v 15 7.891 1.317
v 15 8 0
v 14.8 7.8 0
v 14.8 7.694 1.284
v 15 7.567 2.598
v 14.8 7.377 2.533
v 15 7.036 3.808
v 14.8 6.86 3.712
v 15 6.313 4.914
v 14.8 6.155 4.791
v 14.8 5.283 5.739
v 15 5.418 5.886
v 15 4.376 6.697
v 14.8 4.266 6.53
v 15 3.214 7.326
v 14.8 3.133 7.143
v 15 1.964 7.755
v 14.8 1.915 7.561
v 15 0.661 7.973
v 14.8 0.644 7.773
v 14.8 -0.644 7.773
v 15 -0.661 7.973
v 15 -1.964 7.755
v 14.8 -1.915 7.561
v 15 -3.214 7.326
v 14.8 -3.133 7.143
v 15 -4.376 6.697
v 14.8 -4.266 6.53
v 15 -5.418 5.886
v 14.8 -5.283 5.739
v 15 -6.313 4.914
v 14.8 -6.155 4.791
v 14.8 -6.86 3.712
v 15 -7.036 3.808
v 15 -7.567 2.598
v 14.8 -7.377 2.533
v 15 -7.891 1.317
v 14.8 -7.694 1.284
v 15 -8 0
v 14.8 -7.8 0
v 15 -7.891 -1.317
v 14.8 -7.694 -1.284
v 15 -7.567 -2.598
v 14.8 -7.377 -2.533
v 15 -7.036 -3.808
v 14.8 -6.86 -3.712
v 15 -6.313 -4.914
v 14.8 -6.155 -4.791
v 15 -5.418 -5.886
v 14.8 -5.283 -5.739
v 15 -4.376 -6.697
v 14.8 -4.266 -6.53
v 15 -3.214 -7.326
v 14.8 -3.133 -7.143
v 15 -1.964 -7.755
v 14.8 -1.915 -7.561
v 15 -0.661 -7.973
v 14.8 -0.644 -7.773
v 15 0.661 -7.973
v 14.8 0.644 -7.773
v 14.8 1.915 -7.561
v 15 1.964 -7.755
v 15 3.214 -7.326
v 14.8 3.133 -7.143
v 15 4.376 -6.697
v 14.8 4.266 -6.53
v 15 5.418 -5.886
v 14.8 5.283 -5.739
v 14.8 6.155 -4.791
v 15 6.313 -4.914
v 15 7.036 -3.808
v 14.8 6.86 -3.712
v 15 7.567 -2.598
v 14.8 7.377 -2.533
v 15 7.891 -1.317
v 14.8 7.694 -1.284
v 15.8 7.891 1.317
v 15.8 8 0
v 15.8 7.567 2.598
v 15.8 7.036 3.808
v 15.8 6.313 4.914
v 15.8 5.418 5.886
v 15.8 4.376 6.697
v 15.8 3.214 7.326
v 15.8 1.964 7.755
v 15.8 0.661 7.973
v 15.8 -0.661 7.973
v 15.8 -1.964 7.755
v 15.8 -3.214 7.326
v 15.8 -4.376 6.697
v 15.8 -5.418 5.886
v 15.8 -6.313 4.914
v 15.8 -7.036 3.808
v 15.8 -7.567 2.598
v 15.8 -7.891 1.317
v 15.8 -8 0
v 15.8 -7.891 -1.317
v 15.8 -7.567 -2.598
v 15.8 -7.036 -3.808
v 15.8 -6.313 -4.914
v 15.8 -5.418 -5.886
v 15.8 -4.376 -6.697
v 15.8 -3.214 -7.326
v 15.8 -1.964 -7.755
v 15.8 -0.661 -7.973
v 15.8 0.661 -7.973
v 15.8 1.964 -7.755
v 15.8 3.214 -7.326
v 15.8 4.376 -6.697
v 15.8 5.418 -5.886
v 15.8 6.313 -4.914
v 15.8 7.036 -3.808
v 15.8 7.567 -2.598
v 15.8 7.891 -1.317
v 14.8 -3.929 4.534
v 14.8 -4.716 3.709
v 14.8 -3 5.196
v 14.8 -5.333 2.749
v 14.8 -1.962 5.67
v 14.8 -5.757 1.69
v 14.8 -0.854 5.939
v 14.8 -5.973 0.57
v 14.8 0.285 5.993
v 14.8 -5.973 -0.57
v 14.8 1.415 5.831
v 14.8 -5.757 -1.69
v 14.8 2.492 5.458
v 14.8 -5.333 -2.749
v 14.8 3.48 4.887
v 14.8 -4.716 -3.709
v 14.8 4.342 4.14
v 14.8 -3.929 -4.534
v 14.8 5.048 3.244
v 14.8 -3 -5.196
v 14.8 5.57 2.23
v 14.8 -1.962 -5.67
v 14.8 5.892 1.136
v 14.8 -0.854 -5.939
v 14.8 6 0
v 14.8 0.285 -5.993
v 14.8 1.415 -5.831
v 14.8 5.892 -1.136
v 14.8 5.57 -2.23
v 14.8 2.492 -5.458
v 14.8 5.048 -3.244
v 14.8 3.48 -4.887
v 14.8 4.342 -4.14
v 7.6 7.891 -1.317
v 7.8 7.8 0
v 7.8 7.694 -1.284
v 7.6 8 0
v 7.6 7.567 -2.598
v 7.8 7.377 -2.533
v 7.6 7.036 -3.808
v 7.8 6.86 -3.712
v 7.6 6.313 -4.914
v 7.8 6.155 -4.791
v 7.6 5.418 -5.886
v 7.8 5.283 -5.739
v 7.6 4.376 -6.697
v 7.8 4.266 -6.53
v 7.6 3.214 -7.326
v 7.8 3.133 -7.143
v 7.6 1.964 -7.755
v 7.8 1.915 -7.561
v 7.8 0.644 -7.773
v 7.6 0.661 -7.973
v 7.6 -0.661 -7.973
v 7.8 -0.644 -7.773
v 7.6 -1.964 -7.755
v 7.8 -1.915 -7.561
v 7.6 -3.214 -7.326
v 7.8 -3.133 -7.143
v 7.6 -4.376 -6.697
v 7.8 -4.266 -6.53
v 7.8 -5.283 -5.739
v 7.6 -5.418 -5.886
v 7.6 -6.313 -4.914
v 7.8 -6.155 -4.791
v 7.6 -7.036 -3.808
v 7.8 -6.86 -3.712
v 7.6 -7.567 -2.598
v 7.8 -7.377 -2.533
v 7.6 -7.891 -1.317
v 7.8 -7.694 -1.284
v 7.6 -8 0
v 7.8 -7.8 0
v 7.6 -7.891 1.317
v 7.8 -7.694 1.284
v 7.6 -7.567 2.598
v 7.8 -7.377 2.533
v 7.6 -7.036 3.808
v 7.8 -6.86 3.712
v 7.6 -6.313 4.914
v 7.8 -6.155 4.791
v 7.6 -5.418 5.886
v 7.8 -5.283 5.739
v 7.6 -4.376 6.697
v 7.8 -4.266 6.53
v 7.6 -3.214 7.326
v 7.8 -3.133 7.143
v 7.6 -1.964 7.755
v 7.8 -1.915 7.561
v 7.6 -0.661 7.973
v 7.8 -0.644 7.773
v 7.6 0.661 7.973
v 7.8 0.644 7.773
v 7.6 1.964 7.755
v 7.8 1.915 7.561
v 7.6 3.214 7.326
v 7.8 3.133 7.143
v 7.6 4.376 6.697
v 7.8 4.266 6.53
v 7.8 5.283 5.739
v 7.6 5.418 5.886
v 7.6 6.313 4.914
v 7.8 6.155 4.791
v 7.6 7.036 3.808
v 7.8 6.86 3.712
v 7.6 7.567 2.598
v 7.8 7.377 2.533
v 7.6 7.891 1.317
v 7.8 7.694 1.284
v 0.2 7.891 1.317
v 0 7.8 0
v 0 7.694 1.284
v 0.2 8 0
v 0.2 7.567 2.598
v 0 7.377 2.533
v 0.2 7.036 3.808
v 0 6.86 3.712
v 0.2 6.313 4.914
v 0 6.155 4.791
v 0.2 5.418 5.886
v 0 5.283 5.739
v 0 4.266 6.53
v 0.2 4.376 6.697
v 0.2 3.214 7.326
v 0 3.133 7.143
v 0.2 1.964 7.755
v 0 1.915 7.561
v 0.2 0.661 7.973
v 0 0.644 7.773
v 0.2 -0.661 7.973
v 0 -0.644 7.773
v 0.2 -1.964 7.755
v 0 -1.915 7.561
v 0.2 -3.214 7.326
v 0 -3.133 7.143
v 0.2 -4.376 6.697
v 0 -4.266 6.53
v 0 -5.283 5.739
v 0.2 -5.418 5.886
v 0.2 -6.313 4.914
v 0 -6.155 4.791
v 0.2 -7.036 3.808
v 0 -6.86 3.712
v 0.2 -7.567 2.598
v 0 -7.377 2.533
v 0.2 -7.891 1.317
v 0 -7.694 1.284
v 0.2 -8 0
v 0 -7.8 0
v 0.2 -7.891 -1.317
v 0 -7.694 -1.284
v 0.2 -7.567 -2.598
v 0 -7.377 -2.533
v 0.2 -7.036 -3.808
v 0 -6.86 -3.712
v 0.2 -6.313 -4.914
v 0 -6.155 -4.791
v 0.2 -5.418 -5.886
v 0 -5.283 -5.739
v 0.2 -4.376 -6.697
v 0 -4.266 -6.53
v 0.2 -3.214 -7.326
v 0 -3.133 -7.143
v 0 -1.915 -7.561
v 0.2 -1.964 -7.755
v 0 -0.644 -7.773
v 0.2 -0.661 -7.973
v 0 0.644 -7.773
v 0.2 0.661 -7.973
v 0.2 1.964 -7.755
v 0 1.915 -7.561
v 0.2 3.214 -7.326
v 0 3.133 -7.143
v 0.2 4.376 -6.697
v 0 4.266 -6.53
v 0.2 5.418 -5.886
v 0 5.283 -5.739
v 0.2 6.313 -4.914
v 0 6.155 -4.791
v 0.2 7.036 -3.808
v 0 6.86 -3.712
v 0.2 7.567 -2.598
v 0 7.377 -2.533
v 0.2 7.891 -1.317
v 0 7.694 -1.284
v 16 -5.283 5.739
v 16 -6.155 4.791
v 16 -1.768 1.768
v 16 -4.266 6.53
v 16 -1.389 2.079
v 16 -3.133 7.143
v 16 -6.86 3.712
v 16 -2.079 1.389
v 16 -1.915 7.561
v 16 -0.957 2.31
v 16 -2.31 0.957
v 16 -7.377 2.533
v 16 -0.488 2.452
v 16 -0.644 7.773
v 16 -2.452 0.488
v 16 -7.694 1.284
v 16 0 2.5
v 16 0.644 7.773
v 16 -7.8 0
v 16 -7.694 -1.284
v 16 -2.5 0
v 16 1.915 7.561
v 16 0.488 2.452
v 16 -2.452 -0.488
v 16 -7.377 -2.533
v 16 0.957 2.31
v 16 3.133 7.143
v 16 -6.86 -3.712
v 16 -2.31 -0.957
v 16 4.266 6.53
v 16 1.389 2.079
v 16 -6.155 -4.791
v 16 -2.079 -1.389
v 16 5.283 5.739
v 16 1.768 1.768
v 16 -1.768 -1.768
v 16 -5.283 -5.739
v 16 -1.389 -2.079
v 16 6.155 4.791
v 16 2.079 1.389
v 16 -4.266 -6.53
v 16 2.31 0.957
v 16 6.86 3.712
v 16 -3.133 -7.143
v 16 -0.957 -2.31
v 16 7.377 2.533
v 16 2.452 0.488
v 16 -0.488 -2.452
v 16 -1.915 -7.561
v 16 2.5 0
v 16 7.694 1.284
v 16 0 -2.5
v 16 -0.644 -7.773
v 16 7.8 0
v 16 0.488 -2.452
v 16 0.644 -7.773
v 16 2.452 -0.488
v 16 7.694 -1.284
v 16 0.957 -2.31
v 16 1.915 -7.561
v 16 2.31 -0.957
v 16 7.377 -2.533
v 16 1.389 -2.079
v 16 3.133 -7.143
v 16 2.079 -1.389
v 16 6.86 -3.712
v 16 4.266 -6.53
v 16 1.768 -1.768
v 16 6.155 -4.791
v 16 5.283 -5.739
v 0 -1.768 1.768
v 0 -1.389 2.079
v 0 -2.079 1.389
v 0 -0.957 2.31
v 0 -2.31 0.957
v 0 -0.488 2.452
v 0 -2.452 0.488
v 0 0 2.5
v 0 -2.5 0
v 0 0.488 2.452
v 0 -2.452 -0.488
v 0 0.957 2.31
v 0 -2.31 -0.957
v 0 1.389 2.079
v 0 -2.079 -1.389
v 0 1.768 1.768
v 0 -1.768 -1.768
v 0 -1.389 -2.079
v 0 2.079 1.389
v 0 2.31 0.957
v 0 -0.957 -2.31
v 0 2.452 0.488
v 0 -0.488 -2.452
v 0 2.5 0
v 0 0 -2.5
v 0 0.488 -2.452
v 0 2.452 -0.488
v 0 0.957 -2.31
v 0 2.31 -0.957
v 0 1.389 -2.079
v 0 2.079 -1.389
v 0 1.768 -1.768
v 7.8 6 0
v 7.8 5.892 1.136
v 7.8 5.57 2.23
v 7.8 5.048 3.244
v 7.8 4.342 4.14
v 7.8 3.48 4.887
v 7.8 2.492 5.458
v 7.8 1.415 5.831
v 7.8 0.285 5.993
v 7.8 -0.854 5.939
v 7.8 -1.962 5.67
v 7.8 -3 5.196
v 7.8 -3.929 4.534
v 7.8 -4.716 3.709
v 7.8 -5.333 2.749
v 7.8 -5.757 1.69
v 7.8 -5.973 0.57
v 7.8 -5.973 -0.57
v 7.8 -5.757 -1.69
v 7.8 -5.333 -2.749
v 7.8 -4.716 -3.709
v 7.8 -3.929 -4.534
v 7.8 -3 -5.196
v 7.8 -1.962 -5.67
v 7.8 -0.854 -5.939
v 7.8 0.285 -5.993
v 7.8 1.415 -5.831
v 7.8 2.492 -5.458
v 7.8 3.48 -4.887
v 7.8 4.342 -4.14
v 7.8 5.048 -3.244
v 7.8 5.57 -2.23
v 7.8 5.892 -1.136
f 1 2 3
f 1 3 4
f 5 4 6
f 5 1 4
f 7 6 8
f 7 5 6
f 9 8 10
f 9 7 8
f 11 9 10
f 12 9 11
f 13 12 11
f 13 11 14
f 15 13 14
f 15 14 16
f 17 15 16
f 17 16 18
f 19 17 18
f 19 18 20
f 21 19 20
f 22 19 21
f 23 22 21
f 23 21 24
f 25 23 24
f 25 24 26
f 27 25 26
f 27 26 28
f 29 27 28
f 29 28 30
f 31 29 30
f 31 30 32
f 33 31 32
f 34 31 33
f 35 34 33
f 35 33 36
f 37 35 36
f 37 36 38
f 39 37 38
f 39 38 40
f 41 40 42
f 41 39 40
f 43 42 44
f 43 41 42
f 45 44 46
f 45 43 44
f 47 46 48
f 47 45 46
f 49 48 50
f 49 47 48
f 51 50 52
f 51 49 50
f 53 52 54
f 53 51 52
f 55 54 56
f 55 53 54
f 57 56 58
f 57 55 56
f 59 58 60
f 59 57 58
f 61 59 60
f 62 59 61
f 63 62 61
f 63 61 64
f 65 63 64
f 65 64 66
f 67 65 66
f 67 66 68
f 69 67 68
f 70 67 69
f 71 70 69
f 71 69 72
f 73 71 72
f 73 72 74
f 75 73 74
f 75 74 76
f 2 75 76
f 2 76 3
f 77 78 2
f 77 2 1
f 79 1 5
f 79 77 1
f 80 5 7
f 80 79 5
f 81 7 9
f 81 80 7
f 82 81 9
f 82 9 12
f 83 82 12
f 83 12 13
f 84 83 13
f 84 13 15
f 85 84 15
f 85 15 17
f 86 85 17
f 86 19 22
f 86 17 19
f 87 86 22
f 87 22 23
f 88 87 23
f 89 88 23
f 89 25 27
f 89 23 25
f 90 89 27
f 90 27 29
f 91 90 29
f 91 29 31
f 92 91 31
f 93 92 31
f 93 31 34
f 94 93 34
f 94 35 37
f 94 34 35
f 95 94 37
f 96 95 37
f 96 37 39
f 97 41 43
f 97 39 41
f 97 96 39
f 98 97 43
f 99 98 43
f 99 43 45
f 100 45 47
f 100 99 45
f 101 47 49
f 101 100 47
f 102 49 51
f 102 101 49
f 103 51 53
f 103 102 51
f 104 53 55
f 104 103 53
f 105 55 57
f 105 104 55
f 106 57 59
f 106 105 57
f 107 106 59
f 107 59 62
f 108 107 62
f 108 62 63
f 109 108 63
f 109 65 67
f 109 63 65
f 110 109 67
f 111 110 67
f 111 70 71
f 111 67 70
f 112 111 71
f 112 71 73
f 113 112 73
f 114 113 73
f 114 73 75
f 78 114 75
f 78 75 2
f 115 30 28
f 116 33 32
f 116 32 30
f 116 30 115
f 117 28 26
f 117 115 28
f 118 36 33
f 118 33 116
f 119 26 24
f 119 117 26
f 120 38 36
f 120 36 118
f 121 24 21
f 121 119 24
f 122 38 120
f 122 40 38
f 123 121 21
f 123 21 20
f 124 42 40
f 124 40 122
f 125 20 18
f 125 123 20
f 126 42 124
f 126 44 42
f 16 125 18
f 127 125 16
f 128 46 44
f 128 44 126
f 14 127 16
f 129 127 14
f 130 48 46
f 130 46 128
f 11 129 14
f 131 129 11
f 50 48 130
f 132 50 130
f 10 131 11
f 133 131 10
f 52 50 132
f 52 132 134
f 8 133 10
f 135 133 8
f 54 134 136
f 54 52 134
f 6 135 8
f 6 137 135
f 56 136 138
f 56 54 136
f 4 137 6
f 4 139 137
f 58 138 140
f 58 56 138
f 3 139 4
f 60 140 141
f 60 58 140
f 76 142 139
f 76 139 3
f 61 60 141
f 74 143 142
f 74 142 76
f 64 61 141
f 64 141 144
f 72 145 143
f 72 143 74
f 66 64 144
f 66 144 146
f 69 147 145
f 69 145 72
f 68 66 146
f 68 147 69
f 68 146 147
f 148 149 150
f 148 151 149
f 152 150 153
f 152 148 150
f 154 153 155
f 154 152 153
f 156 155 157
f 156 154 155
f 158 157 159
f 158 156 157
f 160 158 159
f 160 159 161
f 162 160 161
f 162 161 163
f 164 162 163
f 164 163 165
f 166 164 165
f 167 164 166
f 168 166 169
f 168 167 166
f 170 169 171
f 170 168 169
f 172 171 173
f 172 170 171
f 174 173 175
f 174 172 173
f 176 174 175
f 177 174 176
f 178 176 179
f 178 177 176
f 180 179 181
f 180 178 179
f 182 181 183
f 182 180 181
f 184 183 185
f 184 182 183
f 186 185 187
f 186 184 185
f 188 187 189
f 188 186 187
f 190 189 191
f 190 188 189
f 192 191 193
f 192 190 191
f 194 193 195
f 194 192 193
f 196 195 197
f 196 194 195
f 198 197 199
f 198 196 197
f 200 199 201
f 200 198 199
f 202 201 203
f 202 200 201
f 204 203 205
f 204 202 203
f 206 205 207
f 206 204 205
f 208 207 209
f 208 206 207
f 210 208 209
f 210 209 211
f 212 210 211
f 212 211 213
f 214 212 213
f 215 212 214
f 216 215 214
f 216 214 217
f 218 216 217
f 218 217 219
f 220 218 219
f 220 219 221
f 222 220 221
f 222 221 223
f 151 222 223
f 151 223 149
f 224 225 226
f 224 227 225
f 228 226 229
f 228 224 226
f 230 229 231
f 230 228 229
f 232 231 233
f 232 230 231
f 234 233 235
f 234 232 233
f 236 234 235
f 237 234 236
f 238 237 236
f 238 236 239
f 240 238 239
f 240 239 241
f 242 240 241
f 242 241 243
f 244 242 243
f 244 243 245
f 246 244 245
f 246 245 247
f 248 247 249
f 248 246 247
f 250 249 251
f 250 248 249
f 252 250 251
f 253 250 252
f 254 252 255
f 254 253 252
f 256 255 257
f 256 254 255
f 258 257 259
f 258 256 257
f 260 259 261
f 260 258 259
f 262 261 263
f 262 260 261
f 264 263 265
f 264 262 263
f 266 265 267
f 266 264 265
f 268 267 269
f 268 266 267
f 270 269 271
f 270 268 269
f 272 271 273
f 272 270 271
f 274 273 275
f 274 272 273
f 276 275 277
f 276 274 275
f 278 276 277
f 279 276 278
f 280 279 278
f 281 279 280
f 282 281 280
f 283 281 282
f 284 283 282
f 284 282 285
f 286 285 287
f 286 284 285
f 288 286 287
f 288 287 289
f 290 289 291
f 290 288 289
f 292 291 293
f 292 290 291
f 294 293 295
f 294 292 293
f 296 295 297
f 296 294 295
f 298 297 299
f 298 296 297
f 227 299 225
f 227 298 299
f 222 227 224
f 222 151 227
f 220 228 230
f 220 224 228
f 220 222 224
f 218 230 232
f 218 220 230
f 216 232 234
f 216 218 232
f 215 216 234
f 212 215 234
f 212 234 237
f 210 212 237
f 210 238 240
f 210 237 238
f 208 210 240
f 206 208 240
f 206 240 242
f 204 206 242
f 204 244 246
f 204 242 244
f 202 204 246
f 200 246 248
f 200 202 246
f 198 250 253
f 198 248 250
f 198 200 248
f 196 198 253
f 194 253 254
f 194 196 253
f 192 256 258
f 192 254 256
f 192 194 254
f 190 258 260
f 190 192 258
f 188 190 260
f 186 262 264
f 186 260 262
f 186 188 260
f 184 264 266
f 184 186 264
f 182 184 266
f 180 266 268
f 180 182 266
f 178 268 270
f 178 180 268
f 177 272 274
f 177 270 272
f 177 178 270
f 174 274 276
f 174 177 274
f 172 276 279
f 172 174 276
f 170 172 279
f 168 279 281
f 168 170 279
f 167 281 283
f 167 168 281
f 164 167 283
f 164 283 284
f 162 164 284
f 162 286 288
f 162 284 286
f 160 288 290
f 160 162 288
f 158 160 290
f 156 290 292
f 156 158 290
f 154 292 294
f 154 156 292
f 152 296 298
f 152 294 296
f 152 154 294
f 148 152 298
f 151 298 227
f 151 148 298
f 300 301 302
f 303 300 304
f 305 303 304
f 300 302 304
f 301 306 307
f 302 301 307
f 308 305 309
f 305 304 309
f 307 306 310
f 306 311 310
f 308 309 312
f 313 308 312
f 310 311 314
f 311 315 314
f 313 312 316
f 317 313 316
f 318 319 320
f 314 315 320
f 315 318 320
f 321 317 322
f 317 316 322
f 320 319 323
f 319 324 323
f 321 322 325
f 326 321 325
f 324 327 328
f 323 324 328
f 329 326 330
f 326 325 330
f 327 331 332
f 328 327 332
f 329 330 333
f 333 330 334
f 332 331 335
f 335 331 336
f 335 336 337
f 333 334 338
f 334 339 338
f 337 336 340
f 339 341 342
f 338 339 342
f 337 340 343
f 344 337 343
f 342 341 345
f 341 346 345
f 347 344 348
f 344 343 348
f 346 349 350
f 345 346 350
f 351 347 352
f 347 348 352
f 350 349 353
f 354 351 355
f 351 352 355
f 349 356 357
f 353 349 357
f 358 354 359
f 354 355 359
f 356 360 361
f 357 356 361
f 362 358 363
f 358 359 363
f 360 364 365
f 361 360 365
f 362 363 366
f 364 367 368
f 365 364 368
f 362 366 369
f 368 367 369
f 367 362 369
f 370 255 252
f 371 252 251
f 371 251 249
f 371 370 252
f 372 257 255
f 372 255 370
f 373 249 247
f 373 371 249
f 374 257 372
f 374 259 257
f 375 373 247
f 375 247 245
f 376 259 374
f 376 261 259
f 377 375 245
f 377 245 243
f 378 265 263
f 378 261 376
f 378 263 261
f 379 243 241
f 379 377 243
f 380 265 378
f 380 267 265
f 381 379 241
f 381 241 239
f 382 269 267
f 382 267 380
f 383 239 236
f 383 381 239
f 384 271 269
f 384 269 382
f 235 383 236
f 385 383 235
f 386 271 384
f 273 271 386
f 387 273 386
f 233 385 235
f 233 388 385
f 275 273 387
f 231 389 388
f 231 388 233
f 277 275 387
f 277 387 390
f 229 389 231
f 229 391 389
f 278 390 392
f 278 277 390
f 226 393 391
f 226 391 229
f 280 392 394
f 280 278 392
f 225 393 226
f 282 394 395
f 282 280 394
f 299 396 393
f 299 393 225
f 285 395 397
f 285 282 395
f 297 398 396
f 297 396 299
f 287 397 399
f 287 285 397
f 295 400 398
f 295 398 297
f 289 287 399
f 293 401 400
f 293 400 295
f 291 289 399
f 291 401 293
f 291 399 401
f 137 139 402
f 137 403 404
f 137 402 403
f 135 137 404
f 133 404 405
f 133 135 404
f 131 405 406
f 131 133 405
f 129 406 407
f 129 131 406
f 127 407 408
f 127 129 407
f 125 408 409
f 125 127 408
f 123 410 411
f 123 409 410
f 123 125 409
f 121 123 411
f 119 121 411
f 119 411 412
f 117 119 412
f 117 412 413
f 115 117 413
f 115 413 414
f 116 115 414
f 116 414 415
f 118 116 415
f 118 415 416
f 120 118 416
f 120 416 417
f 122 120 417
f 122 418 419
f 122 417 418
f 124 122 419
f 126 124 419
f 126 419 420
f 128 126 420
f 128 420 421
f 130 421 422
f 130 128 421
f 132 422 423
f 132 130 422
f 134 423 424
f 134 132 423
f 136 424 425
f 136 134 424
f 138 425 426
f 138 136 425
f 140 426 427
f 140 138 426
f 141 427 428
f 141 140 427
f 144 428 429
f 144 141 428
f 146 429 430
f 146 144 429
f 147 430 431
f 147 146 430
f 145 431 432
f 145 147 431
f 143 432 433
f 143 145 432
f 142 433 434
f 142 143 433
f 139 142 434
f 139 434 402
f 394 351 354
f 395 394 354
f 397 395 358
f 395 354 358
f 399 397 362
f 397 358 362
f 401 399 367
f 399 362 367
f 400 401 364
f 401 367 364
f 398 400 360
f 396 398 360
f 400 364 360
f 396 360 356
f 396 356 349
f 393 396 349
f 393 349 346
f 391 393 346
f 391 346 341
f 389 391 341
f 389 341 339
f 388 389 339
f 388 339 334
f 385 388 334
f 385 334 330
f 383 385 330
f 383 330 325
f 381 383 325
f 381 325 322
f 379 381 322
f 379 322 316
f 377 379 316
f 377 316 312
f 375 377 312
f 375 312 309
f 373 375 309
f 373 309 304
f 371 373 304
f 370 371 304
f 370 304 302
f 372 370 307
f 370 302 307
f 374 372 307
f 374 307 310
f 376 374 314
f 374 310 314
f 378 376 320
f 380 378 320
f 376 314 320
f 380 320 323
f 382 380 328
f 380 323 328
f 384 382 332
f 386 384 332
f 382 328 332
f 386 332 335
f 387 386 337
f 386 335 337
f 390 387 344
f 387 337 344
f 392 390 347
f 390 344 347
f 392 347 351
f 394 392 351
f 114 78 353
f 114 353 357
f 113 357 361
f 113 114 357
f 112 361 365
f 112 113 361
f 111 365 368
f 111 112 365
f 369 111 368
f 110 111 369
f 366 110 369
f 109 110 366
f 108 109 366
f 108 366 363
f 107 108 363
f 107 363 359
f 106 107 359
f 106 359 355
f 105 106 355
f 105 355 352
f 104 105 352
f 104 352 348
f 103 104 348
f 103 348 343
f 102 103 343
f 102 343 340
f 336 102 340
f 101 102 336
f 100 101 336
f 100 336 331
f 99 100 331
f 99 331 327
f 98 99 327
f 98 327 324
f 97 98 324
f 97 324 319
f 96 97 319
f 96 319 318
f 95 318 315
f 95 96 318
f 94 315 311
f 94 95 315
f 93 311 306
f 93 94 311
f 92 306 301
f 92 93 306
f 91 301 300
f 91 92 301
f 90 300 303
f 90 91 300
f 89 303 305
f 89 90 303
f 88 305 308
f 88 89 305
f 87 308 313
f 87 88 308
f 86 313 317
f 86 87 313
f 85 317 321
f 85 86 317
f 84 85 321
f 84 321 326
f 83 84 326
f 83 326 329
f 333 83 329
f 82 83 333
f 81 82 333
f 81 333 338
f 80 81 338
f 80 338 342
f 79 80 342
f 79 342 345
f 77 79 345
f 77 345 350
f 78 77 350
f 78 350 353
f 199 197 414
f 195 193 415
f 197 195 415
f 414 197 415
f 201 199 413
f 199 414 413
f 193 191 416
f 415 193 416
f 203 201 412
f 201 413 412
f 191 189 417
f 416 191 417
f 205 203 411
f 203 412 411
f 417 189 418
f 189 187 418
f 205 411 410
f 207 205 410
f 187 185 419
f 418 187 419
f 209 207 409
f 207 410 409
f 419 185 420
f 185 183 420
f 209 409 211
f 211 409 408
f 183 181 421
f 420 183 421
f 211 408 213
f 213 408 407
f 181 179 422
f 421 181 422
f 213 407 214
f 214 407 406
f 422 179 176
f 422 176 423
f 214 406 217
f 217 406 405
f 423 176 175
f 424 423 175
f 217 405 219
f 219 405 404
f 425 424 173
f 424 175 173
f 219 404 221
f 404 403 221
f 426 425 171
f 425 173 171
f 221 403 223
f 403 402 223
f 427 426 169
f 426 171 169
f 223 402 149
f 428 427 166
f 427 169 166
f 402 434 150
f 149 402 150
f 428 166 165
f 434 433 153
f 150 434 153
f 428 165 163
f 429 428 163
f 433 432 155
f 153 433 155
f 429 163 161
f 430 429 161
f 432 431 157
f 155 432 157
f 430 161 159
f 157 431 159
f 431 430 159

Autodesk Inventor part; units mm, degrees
ref_plane "YZ Plane" through (0, 0, 0) normal (1, 0, 0) x (0, 1, 0)
ref_plane "XZ Plane" through (0, 0, 0) normal (0, 1, 0) x (-1, 0, 0)
ref_plane "XY Plane" through (0, 0, 0) normal (0, 0, 1) x (1, 0, 0)
sketch "Sketch1" plane through (0, 0, 0) normal (0, 0, 1) x (1, 0, 0)
  line L0 (0, 0) -> (0, 8)
  line L1 (0, 8) -> (7.8, 8)
  line L2 (7.8, 8) -> (7.8, 6)
  line L3 (7.8, 6) -> (14.8, 6)
  line L4 (14.8, 6) -> (14.8, 8)
  line L5 (14.8, 8) -> (16, 8)
  line L6 (16, 8) -> (16, 0)
  line L7 (16, 0) -> (0, 0)
  dimension "d0" = 16
  dimension "d1" = 1.2
  dimension "d2" = 7
  dimension "d3" = 16
  dimension "d4" = 12
revolve "Revolution1" add sketch "Sketch1" angle 360 about axis through (16, 0, 0) along (-1, 0, 0)
chamfer "Chamfer1" distance 0.2 angle 45 4 edges at (7.8, -8, 0) (0, -8, 0) (14.8, -8, 0) (16, -8, 0)
sketch "Sketch2" plane through (16, 0, 0) normal (1, 0, 0) x (0, 0, -1)
  circle A0 centre (0, 0) radius 2.5
  dimension "d9" = 5
extrude "Extrusion1" cut sketch "Sketch2" against normal through all
ref_plane "Work Plane1" through (8, 0, 0) normal (1, 0, 0) x (0, 0, -1)
properties part number "Riemenscheibe"
